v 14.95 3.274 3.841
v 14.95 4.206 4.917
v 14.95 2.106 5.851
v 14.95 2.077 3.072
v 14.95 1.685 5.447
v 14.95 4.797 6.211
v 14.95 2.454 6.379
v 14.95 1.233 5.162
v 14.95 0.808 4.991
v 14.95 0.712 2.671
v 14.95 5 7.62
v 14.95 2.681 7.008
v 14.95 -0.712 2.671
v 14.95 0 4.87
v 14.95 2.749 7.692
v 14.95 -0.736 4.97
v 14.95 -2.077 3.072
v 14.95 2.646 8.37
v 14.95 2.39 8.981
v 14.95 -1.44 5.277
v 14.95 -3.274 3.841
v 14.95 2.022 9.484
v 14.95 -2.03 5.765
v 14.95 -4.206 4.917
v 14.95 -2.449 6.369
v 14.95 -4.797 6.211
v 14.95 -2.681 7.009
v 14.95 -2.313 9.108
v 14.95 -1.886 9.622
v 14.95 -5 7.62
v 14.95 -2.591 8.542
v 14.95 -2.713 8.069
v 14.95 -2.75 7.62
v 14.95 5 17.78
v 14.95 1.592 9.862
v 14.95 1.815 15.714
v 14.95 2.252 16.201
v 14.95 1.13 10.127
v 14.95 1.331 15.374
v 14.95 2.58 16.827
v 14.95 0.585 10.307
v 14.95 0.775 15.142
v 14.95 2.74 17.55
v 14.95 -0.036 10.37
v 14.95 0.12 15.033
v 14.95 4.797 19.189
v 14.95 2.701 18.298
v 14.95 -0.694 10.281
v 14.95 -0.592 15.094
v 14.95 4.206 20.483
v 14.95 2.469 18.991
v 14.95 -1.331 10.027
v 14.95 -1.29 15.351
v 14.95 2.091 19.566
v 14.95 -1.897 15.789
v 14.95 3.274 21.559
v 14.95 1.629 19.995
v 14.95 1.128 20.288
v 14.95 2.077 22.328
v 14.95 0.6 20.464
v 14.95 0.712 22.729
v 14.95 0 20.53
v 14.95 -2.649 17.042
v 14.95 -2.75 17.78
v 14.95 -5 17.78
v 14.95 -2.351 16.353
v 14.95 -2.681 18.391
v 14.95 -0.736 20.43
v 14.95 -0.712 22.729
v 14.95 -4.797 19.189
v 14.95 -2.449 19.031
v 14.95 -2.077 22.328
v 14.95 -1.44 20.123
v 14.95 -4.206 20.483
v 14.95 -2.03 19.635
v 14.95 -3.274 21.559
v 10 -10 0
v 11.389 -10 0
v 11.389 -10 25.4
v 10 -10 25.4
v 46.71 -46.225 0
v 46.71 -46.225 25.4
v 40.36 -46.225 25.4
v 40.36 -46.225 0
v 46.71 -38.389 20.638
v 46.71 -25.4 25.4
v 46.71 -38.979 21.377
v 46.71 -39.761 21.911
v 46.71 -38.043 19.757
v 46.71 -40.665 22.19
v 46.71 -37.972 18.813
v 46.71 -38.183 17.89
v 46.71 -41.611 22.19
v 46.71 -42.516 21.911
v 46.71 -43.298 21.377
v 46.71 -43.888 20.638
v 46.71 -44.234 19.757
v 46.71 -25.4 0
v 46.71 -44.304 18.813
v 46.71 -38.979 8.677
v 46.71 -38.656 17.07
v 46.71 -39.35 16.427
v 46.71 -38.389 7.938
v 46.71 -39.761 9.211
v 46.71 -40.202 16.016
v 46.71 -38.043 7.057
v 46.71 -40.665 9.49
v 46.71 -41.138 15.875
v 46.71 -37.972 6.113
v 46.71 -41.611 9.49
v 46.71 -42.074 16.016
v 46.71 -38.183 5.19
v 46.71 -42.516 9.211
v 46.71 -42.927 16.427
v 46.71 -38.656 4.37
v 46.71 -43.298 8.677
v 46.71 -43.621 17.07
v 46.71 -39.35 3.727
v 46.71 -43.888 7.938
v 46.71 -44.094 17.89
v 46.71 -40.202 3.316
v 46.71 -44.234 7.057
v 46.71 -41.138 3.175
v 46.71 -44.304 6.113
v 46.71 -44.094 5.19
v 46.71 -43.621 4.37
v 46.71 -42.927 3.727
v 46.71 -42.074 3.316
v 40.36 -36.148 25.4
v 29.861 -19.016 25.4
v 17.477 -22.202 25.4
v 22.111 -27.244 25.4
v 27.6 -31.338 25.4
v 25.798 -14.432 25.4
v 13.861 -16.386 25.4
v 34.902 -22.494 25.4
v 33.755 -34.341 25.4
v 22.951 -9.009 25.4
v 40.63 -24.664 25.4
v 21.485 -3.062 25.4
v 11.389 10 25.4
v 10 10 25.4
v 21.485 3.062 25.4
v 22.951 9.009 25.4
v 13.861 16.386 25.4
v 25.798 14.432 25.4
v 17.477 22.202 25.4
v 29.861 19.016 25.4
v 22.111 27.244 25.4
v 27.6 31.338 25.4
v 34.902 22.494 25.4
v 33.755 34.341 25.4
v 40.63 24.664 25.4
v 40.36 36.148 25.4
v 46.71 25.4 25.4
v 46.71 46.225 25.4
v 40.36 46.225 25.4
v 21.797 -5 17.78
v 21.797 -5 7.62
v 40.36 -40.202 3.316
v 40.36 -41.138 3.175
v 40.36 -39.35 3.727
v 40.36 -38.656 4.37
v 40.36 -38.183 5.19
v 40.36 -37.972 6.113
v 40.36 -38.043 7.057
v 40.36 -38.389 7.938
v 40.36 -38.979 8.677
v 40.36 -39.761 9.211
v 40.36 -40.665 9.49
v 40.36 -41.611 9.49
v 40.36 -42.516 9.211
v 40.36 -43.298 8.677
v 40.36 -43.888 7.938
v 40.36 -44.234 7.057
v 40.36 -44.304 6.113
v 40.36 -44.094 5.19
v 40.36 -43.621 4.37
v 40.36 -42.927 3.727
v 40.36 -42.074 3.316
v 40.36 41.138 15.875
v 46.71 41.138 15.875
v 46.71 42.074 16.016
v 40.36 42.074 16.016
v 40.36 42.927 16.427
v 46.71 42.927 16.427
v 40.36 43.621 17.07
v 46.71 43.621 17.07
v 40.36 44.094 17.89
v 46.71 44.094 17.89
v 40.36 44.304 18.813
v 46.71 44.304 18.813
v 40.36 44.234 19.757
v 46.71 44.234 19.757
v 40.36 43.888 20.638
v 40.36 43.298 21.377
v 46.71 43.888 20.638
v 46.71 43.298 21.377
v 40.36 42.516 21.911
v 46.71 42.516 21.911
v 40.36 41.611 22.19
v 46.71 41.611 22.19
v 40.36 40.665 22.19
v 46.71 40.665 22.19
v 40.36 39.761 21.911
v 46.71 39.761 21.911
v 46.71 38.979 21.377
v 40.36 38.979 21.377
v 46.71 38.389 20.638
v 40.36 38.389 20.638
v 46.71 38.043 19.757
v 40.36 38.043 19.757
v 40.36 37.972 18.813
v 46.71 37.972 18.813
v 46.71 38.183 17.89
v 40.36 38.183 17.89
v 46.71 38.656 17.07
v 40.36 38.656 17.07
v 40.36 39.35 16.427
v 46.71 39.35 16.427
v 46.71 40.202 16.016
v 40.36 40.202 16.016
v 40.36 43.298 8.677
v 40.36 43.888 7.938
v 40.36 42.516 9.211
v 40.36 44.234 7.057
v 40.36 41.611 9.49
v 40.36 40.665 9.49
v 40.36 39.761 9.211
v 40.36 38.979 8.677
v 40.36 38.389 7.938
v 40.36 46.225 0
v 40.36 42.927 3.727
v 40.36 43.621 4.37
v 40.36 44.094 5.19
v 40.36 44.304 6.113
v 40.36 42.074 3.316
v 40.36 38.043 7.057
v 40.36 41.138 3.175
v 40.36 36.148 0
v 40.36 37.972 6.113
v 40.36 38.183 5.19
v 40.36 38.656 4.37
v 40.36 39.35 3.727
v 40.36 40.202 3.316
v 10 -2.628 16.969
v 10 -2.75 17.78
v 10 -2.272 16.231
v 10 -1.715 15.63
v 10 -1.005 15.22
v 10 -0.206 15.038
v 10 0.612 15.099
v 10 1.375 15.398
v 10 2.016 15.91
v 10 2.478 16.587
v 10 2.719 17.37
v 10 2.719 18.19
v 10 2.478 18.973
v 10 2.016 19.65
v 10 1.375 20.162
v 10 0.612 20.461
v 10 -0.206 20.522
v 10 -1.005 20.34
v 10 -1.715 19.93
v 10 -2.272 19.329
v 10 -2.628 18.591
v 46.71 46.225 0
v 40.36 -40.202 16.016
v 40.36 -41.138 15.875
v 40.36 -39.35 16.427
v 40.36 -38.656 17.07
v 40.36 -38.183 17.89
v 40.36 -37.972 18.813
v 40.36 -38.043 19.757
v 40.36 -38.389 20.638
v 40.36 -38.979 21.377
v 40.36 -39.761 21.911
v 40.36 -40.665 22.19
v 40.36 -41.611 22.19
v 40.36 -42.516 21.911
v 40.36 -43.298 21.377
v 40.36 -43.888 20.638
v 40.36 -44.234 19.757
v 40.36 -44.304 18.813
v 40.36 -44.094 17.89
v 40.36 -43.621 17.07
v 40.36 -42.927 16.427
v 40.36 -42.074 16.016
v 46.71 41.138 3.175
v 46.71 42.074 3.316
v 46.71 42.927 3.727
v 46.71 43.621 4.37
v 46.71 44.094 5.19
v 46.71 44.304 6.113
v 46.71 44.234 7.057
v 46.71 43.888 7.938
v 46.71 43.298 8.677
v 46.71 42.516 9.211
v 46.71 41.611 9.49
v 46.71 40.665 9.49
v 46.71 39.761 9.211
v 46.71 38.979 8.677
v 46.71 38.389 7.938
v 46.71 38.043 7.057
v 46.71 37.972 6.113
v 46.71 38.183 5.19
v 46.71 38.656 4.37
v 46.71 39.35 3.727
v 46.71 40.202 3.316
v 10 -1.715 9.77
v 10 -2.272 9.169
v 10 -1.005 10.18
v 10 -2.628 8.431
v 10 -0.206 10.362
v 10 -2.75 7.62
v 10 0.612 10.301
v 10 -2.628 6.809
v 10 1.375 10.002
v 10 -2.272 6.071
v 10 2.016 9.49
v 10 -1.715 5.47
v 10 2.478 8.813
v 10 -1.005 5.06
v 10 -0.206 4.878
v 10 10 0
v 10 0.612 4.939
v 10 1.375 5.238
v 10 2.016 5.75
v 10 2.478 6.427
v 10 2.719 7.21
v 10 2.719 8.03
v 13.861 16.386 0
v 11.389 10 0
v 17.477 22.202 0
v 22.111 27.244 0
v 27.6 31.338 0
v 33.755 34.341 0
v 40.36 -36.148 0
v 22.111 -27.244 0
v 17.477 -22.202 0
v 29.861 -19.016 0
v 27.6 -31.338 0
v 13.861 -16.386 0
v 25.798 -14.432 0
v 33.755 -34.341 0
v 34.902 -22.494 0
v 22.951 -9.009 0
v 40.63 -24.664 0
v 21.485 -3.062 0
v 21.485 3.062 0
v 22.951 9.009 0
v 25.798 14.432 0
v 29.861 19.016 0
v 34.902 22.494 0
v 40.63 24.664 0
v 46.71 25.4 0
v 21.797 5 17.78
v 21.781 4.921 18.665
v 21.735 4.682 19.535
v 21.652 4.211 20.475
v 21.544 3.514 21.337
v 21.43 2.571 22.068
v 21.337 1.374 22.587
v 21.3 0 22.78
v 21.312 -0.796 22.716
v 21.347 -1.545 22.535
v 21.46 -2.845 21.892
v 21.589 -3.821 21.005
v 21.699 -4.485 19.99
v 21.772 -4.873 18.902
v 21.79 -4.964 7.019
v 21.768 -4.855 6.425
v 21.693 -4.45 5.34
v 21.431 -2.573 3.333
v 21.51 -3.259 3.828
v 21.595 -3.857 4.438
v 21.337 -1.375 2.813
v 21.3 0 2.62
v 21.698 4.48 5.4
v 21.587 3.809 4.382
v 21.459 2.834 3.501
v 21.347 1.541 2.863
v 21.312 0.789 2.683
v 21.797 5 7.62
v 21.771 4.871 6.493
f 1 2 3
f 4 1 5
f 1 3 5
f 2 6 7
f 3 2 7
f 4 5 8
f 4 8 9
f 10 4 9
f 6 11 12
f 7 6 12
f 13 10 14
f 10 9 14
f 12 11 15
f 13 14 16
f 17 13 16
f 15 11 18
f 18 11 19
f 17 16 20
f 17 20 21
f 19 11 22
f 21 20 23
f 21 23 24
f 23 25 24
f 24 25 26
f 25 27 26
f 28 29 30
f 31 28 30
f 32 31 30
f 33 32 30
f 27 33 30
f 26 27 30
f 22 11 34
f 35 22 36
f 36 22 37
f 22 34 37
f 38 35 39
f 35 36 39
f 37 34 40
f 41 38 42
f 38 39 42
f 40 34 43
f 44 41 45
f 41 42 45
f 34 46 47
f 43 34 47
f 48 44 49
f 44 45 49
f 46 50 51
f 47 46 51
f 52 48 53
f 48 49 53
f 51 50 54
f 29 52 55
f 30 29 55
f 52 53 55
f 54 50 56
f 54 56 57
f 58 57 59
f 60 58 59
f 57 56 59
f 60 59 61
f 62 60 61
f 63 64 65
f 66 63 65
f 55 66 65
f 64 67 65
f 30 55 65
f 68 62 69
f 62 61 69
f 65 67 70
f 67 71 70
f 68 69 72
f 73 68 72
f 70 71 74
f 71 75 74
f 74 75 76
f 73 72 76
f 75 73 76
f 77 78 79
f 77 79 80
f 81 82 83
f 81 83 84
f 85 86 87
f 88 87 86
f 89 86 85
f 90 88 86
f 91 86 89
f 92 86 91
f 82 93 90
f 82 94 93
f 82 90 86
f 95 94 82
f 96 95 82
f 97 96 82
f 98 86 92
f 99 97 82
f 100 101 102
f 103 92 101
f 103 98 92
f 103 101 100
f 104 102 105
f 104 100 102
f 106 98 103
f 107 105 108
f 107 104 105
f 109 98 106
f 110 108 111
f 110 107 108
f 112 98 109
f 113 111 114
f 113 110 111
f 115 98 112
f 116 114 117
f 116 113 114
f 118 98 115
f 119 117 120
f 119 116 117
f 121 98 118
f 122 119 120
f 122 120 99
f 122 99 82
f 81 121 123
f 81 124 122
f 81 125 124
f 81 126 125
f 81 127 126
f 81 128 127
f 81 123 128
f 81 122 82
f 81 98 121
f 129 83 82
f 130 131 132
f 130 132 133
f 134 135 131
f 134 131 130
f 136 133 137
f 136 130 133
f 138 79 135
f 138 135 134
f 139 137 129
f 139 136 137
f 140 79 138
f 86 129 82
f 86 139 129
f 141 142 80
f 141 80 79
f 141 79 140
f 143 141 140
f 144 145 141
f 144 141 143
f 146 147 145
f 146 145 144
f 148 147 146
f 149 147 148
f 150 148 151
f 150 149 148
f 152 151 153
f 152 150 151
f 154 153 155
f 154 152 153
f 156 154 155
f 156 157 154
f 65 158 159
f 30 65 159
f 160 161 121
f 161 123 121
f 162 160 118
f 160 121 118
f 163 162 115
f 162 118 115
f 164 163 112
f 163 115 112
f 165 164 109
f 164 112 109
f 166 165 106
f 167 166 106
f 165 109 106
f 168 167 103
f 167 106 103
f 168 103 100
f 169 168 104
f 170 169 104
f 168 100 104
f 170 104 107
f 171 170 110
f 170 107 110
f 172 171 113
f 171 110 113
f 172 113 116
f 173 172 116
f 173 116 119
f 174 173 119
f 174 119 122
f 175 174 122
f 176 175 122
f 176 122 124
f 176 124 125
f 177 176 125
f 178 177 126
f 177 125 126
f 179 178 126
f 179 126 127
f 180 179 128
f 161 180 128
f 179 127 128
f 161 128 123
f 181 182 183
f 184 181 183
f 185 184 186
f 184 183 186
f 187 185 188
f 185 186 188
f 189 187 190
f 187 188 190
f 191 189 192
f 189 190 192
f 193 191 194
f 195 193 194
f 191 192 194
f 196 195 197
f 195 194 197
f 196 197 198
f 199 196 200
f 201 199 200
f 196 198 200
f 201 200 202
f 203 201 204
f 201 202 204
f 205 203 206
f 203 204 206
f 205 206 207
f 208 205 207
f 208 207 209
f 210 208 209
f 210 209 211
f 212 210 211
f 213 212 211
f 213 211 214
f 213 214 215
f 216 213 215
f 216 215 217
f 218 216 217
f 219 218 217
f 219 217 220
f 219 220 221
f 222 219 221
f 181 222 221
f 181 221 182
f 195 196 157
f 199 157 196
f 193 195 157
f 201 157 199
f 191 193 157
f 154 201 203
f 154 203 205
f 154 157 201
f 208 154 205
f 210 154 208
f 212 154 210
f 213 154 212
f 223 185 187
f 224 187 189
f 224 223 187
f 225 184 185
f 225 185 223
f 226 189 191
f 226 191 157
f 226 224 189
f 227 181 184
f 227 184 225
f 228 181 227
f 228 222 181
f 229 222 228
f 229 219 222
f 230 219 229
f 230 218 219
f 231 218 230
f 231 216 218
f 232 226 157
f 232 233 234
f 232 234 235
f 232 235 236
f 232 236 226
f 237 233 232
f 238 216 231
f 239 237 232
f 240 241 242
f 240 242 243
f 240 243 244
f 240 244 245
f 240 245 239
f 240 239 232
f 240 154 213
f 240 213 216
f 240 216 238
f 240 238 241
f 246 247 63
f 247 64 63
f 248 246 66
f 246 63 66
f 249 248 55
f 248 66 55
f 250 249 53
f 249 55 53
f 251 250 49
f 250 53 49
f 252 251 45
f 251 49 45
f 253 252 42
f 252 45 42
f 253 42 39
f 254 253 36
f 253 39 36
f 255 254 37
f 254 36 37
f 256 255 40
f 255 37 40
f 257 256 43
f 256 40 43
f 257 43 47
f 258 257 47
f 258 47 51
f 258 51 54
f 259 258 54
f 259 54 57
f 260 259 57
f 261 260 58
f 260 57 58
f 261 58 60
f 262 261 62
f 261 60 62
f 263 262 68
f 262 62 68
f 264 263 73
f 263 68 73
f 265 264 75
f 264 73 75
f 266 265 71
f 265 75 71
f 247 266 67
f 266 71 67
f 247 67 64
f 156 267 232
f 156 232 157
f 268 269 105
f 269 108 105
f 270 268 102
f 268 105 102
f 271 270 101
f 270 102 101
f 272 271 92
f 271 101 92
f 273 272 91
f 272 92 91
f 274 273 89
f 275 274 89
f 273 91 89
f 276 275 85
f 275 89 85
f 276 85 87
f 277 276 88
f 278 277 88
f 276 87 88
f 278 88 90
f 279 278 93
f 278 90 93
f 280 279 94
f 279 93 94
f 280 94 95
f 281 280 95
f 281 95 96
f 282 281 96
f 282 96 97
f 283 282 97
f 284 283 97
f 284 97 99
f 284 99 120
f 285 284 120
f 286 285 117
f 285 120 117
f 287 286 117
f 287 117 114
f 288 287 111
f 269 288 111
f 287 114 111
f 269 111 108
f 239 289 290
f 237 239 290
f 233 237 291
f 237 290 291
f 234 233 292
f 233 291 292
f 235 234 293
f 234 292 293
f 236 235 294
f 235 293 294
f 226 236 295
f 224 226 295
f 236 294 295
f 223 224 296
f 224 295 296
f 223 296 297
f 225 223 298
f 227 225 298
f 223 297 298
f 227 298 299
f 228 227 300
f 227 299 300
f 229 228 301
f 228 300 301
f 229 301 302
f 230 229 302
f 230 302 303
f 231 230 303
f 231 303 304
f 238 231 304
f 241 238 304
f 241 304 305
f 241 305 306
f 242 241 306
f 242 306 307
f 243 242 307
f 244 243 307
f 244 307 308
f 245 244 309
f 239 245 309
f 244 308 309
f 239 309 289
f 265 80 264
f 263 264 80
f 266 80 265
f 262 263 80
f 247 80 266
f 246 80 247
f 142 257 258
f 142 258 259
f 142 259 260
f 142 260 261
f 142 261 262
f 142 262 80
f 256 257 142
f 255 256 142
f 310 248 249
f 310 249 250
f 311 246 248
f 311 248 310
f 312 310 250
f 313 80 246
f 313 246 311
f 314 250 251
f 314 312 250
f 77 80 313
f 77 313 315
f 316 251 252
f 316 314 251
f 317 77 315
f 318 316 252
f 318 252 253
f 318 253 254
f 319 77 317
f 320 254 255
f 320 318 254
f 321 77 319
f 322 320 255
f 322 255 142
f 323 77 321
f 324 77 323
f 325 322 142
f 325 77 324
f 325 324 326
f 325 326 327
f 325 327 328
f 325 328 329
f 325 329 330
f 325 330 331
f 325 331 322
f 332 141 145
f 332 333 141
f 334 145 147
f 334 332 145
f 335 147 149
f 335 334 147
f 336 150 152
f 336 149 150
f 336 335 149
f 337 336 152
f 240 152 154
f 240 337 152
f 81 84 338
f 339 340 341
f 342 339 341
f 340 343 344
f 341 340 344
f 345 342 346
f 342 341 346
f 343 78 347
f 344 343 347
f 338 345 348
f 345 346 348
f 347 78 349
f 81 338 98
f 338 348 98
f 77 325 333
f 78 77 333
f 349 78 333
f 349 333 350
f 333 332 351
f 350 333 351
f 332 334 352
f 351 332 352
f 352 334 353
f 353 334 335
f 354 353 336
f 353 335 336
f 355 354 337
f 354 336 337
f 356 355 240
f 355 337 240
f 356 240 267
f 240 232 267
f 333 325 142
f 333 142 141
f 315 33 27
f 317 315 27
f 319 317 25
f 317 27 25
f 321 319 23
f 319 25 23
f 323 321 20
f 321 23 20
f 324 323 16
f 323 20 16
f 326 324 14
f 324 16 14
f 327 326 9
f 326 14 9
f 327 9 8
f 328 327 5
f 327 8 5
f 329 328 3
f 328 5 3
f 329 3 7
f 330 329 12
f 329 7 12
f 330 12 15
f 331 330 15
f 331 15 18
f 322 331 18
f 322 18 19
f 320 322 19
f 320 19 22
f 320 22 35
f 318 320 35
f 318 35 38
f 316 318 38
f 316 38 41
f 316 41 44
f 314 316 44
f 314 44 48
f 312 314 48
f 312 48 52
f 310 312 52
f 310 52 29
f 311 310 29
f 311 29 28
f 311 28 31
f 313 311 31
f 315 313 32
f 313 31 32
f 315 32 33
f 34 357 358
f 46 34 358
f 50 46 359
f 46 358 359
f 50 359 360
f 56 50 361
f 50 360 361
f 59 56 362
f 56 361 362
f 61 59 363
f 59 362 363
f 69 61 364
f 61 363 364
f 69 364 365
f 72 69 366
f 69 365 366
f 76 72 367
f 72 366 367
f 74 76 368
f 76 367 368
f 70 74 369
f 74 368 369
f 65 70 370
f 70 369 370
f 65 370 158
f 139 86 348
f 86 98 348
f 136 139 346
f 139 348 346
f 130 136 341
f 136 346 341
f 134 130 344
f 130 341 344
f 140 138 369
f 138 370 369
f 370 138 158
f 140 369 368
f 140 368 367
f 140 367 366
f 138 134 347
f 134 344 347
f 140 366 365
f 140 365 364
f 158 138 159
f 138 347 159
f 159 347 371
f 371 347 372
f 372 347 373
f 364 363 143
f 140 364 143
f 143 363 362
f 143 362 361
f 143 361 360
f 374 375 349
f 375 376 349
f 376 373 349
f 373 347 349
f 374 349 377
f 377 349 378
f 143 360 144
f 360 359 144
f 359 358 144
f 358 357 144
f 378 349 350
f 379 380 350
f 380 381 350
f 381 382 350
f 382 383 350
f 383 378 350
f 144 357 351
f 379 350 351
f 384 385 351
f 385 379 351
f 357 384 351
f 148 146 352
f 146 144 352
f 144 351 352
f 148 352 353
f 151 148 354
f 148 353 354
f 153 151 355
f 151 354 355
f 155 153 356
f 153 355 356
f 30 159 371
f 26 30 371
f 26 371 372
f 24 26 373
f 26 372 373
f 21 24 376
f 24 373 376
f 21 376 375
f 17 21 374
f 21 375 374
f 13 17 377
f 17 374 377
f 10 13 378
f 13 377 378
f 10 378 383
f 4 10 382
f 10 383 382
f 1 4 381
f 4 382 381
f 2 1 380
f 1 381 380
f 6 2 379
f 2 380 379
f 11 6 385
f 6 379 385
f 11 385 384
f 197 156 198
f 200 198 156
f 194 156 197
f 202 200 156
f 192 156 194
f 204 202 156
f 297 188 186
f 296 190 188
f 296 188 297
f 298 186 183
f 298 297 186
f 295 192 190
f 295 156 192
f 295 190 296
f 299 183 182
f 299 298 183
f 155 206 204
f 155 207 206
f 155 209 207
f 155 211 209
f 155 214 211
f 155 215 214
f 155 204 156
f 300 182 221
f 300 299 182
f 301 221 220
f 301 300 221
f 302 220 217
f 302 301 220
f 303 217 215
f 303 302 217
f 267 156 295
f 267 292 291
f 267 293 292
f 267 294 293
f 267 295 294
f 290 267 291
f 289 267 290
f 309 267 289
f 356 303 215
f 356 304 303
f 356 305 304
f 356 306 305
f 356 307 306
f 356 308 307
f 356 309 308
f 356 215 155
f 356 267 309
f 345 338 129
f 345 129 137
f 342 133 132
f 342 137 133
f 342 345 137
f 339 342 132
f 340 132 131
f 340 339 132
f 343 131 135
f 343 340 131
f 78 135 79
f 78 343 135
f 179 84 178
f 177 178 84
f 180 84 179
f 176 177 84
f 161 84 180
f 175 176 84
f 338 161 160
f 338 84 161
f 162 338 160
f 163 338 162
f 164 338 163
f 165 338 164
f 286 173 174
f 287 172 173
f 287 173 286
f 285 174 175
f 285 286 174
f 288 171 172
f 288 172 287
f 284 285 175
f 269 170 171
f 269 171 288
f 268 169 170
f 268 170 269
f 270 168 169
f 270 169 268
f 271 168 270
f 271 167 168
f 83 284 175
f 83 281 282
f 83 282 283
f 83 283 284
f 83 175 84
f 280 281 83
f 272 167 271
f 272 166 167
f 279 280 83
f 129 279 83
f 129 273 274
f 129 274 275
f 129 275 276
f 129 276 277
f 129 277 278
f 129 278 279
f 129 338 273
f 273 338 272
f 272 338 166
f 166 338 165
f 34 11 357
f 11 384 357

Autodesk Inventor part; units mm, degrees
sketch "Sketch1" plane through (0, 0, 0) normal (0, 0, 1) x (1, 0, 0)
  arc A0 (-10, -8.75) -> (-8.75, -10) centre (-8.75, -8.75) ccw projected
  line L0 (-8.75, -10) -> (-3.6, -10) projected
  line L1 (-3.6, -10) -> (-3.1, -9.5) projected
  line L2 (-3.1, -9.5) -> (-3.1, -8.4) projected
  line L3 (-3.1, -8.4) -> (-5.5, -8.4) projected
  line L4 (-5.5, -8.4) -> (-5.5, -6.466) projected
  line L5 (-5.5, -6.466) -> (-3.134, -4.1) projected
  line L6 (-3.134, -4.1) -> (3.134, -4.1) projected
  line L7 (3.134, -4.1) -> (5.5, -6.466) projected
  line L8 (5.5, -6.466) -> (5.5, -8.4) projected
  line L9 (5.5, -8.4) -> (3.1, -8.4) projected
  line L10 (3.1, -8.4) -> (3.1, -9.5) projected
  line L11 (3.1, -9.5) -> (3.6, -10) projected
  line L12 (3.6, -10) -> (8.75, -10) projected
  arc A1 (8.75, -10) -> (10, -8.75) centre (8.75, -8.75) ccw projected
  line L13 (10, -8.75) -> (10, -3.6) projected
  line L14 (10, -3.6) -> (9.5, -3.1) projected
  line L15 (9.5, -3.1) -> (8.4, -3.1) projected
  line L16 (8.4, -3.1) -> (8.4, -5.5) projected
  line L17 (8.4, -5.5) -> (6.466, -5.5) projected
  line L18 (6.466, -5.5) -> (4.1, -3.134) projected
  line L19 (4.1, -3.134) -> (4.1, 3.134) projected
  line L20 (4.1, 3.134) -> (6.466, 5.5) projected
  line L21 (6.466, 5.5) -> (8.4, 5.5) projected
  line L22 (8.4, 5.5) -> (8.4, 3.1) projected
  line L23 (8.4, 3.1) -> (9.5, 3.1) projected
  line L24 (9.5, 3.1) -> (10, 3.6) projected
  line L25 (10, 3.6) -> (10, 8.75) projected
  arc A2 (10, 8.75) -> (8.75, 10) centre (8.75, 8.75) ccw projected
  line L26 (8.75, 10) -> (3.6, 10) projected
  line L27 (3.6, 10) -> (3.1, 9.5) projected
  line L28 (3.1, 9.5) -> (3.1, 8.4) projected
  line L29 (3.1, 8.4) -> (5.5, 8.4) projected
  line L30 (5.5, 8.4) -> (5.5, 6.466) projected
  line L31 (5.5, 6.466) -> (3.134, 4.1) projected
  line L32 (3.134, 4.1) -> (-3.134, 4.1) projected
  line L33 (-3.134, 4.1) -> (-5.5, 6.466) projected
  line L34 (-5.5, 6.466) -> (-5.5, 8.4) projected
  line L35 (-5.5, 8.4) -> (-3.1, 8.4) projected
  line L36 (-3.1, 8.4) -> (-3.1, 9.5) projected
  line L37 (-3.1, 9.5) -> (-3.6, 10) projected
  line L38 (-3.6, 10) -> (-8.75, 10) projected
  arc A3 (-8.75, 10) -> (-10, 8.75) centre (-8.75, 8.75) ccw projected
  line L39 (-10, 8.75) -> (-10, 3.6) projected
  line L40 (-10, 3.6) -> (-9.5, 3.1) projected
  line L41 (-9.5, 3.1) -> (-8.4, 3.1) projected
  line L42 (-8.4, 3.1) -> (-8.4, 5.5) projected
  line L43 (-8.4, 5.5) -> (-6.466, 5.5) projected
  line L44 (-6.466, 5.5) -> (-4.1, 3.134) projected
  line L45 (-4.1, 3.134) -> (-4.1, -3.134) projected
  line L46 (-4.1, -3.134) -> (-6.466, -5.5) projected
  line L47 (-6.466, -5.5) -> (-8.4, -5.5) projected
  line L48 (-8.4, -5.5) -> (-8.4, -3.1) projected
  line L49 (-8.4, -3.1) -> (-9.5, -3.1) projected
  line L50 (-9.5, -3.1) -> (-10, -3.6) projected
  line L51 (-10, -3.6) -> (-10, -8.75) projected
  circle A4 centre (0, 0) radius 2.5 projected
  circle A5 centre (46.7, 0) radius 4.5 projected
  arc A6 (46.7103, 25.4) -> (46.7103, -25.4) centre (46.7, 0) ccw
  line L52 (10, 10) -> (16.35, 10)
  line L53 (16.35, 10) -> (16.35, -10)
  line L54 (16.35, -10) -> (10, -10)
  line L55 (10, -10) -> (10, 10)
  arc A7 (46.7103, 36.7) -> (46.7103, -36.7) centre (46.7, 0) ccw
  line L56 (46.7103, 36.7) -> (46.7103, 25.4)
  line L57 (46.7103, -25.4) -> (46.7103, -36.7)
  dimension "d0" = 50.8
  dimension "d1" = 20
  dimension "d2" = 6.35
extrude "Extrusion1" add sketch "Sketch1" along normal blind 25.4 contours L13 L55 A7 L54 | L55 L25 L52 A7 | A7 L52 L53 L54 | L54 L53 L52 A7 L56 A6 L57
ref_plane "Work Plane1" through (46.7103, 36.7, 0) normal (0, 1, 0) x (0, 0, 1)
sketch "Sketch2" plane through (46.7103, 36.7, 0) normal (0, 1, 0) x (0, 0, 1)
  line L0 (0, 0) -> (25.4, 0) projected
  line L1 (25.4, -35.3216) -> (25.4, 0) projected
  line L2 (0, 0) -> (25.4, 0)
  line L3 (25.4, 0) -> (25.4, -6.35)
  line L4 (25.4, -6.35) -> (0, -6.35)
  line L5 (0, -6.35) -> (0, 0)
  point P0 (0, -46.7103)
  dimension "d6" = 6.35
extrude "Extrusion2" add sketch "Sketch2" along normal mid plane 19.05
ref_plane "Work Plane2" through (10, 0, 0) normal (0, 1, 0) x (1, 0, 0)
mirror "Mirror1" about plane through (10, 0, 0) normal (0, 1, 0) of "Extrusion2"
sketch "Sketch3" plane through (46.7103, -25.4, 25.4) normal (1, 0, 0) x (0, 0, -1)
  circle A0 centre (19.05, -15.7382) radius 3.175 projected
  circle A1 centre (6.35, -15.7382) radius 3.175 projected
  circle A2 centre (6.35, 66.5382) radius 3.175 projected
  circle A3 centre (19.05, 66.5382) radius 3.175 projected
  point P0 (25.4, 25.4)
extrude "Extrusion3" cut sketch "Sketch3" against normal through all
ref_plane "Work Plane4" through (21.3, 0, 0) normal (-1, 0, 0) x (0, -1, 0)
ref_plane "Work Plane3" through (72.1, 0, 0) normal (-1, 0, 0) x (0, -1, 0)
sketch "Sketch4" plane through (72.1, 0, 0) normal (-1, 0, 0) x (0, -1, 0)
  line L0 (0, 0) -> (0, 25.4) construction
  line L1 (-10, 25.4) -> (10, 25.4) projected
  circle A0 centre (0, 17.78) radius 2.75
  circle A1 centre (0, 7.62) radius 2.75
  line L2 (-25.4, 0) -> (25.4, 0) projected
  dimension "d13" = 5.5
  dimension "d14" = 7.62
  dimension "d15" = 7.62
extrude "Extrusion4" cut sketch "Sketch4" along normal through all
sketch "Sketch5" plane through (72.1, 0, 0) normal (-1, 0, 0) x (0, -1, 0)
  spline S0 degree 2 poles (2.75, 17.78) (2.75, 13.0169) (-1.375, 15.3984) (-5.5, 17.78) (-1.375, 20.1616) (2.75, 22.5431) (2.75, 17.78) knots 0 0 0 0.333333 0.333333 0.666667 0.666667 1 1 1 weights 1 0.5 1 0.5 1 0.5 1 projected
  spline S1 degree 2 poles (2.75, 7.62) (2.75, 2.8569) (-1.375, 5.2384) (-5.5, 7.62) (-1.375, 10.0016) (2.75, 12.3831) (2.75, 7.62) knots 0 0 0 0.333333 0.333333 0.666667 0.666667 1 1 1 weights 1 0.5 1 0.5 1 0.5 1 projected
  circle A0 centre (0, 7.62) radius 2.75 projected
  line L0 (5, 12.7) -> (5, 7.62)
  arc A1 (-5, 7.62) -> (5, 7.62) centre (0, 7.62) ccw
  spline S2 degree 7 poles (2.75, 17.78) (2.75, 18.0802) (2.7118, 18.38) (2.6355, 18.6767) (2.52, 18.9674) (2.3634, 19.248) (2.1631, 19.5126) (1.7177, 19.9454) (1.4837, 20.1274) (1.2158, 20.2864) (0.9183, 20.4129) (0.5978, 20.4988) (0.2624, 20.5386) (-0.4242, 20.519) (-0.7584, 20.4587) (-1.0728, 20.3535) (-1.3607, 20.2102) (-1.617, 20.0371) (-1.8389, 19.8434) (-2.2394, 19.407) (-2.4132, 19.1552) (-2.5494, 18.8907) (-2.6501, 18.6181) (-2.7166, 18.3405) (-2.75, 18.0604) (-2.75, 17.4798) (-2.7118, 17.18) (-2.6355, 16.8833) (-2.52, 16.5926) (-2.3634, 16.312) (-2.1631, 16.0474) (-1.7177, 15.6146) (-1.4837, 15.4326) (-1.2158, 15.2736) (-0.9183, 15.1471) (-0.5978, 15.0612) (-0.2624, 15.0214) (0.4242, 15.041) (0.7584, 15.1013) (1.0728, 15.2065) (1.3607, 15.3498) (1.617, 15.5229) (1.8389, 15.7166) (2.2394, 16.153) (2.4132, 16.4048) (2.5494, 16.6693) (2.6501, 16.9419) (2.7166, 17.2195) (2.75, 17.4996) (2.75, 17.78) knots 0 0 0 0 0 0 0 0 0.14065 0.14065 0.14065 0.14065 0.14065 0.14065 0.254122 0.254122 0.254122 0.254122 0.254122 0.254122 0.369156 0.369156 0.369156 0.369156 0.369156 0.369156 0.500342 0.500342 0.500342 0.500342 0.500342 0.500342 0.640802 0.640802 0.640802 0.640802 0.640802 0.640802 0.754121 0.754121 0.754121 0.754121 0.754121 0.754121 0.869 0.869 0.869 0.869 0.869 0.869 1 1 1 1 1 1 1 1 projected
  line L1 (25.4, 0) -> (-25.4, 0) projected
  line L2 (-25.4, 0) -> (-25.4, 25.4) projected
  line L3 (25.4, 25.4) -> (-25.4, 25.4) projected
  line L4 (25.4, 0) -> (25.4, 25.4) projected
  line L5 (-10, 25.4) -> (10, 25.4) projected
  line L6 (0, 25.4) -> (0, 20.53)
  line L7 (0, 15.03) -> (0, 10.37) construction
  line L8 (0, 4.87) -> (0, 0)
  line L9 (-5.6857, 12.7) -> (9.2801, 12.7) construction
  line L10 (-5, 7.62) -> (-5, 12.7)
  line L11 (5, 12.7) -> (5, 17.78)
  arc A2 (5, 17.78) -> (-5, 17.78) centre (0, 17.78) ccw
  line L12 (-5, 17.78) -> (-5, 12.7)
extrude "Extrusion5" cut sketch "Sketch5" along normal blind 57.15 contours L0 A1 L10 L12 A2 L11
properties part number "DremelHolder"
